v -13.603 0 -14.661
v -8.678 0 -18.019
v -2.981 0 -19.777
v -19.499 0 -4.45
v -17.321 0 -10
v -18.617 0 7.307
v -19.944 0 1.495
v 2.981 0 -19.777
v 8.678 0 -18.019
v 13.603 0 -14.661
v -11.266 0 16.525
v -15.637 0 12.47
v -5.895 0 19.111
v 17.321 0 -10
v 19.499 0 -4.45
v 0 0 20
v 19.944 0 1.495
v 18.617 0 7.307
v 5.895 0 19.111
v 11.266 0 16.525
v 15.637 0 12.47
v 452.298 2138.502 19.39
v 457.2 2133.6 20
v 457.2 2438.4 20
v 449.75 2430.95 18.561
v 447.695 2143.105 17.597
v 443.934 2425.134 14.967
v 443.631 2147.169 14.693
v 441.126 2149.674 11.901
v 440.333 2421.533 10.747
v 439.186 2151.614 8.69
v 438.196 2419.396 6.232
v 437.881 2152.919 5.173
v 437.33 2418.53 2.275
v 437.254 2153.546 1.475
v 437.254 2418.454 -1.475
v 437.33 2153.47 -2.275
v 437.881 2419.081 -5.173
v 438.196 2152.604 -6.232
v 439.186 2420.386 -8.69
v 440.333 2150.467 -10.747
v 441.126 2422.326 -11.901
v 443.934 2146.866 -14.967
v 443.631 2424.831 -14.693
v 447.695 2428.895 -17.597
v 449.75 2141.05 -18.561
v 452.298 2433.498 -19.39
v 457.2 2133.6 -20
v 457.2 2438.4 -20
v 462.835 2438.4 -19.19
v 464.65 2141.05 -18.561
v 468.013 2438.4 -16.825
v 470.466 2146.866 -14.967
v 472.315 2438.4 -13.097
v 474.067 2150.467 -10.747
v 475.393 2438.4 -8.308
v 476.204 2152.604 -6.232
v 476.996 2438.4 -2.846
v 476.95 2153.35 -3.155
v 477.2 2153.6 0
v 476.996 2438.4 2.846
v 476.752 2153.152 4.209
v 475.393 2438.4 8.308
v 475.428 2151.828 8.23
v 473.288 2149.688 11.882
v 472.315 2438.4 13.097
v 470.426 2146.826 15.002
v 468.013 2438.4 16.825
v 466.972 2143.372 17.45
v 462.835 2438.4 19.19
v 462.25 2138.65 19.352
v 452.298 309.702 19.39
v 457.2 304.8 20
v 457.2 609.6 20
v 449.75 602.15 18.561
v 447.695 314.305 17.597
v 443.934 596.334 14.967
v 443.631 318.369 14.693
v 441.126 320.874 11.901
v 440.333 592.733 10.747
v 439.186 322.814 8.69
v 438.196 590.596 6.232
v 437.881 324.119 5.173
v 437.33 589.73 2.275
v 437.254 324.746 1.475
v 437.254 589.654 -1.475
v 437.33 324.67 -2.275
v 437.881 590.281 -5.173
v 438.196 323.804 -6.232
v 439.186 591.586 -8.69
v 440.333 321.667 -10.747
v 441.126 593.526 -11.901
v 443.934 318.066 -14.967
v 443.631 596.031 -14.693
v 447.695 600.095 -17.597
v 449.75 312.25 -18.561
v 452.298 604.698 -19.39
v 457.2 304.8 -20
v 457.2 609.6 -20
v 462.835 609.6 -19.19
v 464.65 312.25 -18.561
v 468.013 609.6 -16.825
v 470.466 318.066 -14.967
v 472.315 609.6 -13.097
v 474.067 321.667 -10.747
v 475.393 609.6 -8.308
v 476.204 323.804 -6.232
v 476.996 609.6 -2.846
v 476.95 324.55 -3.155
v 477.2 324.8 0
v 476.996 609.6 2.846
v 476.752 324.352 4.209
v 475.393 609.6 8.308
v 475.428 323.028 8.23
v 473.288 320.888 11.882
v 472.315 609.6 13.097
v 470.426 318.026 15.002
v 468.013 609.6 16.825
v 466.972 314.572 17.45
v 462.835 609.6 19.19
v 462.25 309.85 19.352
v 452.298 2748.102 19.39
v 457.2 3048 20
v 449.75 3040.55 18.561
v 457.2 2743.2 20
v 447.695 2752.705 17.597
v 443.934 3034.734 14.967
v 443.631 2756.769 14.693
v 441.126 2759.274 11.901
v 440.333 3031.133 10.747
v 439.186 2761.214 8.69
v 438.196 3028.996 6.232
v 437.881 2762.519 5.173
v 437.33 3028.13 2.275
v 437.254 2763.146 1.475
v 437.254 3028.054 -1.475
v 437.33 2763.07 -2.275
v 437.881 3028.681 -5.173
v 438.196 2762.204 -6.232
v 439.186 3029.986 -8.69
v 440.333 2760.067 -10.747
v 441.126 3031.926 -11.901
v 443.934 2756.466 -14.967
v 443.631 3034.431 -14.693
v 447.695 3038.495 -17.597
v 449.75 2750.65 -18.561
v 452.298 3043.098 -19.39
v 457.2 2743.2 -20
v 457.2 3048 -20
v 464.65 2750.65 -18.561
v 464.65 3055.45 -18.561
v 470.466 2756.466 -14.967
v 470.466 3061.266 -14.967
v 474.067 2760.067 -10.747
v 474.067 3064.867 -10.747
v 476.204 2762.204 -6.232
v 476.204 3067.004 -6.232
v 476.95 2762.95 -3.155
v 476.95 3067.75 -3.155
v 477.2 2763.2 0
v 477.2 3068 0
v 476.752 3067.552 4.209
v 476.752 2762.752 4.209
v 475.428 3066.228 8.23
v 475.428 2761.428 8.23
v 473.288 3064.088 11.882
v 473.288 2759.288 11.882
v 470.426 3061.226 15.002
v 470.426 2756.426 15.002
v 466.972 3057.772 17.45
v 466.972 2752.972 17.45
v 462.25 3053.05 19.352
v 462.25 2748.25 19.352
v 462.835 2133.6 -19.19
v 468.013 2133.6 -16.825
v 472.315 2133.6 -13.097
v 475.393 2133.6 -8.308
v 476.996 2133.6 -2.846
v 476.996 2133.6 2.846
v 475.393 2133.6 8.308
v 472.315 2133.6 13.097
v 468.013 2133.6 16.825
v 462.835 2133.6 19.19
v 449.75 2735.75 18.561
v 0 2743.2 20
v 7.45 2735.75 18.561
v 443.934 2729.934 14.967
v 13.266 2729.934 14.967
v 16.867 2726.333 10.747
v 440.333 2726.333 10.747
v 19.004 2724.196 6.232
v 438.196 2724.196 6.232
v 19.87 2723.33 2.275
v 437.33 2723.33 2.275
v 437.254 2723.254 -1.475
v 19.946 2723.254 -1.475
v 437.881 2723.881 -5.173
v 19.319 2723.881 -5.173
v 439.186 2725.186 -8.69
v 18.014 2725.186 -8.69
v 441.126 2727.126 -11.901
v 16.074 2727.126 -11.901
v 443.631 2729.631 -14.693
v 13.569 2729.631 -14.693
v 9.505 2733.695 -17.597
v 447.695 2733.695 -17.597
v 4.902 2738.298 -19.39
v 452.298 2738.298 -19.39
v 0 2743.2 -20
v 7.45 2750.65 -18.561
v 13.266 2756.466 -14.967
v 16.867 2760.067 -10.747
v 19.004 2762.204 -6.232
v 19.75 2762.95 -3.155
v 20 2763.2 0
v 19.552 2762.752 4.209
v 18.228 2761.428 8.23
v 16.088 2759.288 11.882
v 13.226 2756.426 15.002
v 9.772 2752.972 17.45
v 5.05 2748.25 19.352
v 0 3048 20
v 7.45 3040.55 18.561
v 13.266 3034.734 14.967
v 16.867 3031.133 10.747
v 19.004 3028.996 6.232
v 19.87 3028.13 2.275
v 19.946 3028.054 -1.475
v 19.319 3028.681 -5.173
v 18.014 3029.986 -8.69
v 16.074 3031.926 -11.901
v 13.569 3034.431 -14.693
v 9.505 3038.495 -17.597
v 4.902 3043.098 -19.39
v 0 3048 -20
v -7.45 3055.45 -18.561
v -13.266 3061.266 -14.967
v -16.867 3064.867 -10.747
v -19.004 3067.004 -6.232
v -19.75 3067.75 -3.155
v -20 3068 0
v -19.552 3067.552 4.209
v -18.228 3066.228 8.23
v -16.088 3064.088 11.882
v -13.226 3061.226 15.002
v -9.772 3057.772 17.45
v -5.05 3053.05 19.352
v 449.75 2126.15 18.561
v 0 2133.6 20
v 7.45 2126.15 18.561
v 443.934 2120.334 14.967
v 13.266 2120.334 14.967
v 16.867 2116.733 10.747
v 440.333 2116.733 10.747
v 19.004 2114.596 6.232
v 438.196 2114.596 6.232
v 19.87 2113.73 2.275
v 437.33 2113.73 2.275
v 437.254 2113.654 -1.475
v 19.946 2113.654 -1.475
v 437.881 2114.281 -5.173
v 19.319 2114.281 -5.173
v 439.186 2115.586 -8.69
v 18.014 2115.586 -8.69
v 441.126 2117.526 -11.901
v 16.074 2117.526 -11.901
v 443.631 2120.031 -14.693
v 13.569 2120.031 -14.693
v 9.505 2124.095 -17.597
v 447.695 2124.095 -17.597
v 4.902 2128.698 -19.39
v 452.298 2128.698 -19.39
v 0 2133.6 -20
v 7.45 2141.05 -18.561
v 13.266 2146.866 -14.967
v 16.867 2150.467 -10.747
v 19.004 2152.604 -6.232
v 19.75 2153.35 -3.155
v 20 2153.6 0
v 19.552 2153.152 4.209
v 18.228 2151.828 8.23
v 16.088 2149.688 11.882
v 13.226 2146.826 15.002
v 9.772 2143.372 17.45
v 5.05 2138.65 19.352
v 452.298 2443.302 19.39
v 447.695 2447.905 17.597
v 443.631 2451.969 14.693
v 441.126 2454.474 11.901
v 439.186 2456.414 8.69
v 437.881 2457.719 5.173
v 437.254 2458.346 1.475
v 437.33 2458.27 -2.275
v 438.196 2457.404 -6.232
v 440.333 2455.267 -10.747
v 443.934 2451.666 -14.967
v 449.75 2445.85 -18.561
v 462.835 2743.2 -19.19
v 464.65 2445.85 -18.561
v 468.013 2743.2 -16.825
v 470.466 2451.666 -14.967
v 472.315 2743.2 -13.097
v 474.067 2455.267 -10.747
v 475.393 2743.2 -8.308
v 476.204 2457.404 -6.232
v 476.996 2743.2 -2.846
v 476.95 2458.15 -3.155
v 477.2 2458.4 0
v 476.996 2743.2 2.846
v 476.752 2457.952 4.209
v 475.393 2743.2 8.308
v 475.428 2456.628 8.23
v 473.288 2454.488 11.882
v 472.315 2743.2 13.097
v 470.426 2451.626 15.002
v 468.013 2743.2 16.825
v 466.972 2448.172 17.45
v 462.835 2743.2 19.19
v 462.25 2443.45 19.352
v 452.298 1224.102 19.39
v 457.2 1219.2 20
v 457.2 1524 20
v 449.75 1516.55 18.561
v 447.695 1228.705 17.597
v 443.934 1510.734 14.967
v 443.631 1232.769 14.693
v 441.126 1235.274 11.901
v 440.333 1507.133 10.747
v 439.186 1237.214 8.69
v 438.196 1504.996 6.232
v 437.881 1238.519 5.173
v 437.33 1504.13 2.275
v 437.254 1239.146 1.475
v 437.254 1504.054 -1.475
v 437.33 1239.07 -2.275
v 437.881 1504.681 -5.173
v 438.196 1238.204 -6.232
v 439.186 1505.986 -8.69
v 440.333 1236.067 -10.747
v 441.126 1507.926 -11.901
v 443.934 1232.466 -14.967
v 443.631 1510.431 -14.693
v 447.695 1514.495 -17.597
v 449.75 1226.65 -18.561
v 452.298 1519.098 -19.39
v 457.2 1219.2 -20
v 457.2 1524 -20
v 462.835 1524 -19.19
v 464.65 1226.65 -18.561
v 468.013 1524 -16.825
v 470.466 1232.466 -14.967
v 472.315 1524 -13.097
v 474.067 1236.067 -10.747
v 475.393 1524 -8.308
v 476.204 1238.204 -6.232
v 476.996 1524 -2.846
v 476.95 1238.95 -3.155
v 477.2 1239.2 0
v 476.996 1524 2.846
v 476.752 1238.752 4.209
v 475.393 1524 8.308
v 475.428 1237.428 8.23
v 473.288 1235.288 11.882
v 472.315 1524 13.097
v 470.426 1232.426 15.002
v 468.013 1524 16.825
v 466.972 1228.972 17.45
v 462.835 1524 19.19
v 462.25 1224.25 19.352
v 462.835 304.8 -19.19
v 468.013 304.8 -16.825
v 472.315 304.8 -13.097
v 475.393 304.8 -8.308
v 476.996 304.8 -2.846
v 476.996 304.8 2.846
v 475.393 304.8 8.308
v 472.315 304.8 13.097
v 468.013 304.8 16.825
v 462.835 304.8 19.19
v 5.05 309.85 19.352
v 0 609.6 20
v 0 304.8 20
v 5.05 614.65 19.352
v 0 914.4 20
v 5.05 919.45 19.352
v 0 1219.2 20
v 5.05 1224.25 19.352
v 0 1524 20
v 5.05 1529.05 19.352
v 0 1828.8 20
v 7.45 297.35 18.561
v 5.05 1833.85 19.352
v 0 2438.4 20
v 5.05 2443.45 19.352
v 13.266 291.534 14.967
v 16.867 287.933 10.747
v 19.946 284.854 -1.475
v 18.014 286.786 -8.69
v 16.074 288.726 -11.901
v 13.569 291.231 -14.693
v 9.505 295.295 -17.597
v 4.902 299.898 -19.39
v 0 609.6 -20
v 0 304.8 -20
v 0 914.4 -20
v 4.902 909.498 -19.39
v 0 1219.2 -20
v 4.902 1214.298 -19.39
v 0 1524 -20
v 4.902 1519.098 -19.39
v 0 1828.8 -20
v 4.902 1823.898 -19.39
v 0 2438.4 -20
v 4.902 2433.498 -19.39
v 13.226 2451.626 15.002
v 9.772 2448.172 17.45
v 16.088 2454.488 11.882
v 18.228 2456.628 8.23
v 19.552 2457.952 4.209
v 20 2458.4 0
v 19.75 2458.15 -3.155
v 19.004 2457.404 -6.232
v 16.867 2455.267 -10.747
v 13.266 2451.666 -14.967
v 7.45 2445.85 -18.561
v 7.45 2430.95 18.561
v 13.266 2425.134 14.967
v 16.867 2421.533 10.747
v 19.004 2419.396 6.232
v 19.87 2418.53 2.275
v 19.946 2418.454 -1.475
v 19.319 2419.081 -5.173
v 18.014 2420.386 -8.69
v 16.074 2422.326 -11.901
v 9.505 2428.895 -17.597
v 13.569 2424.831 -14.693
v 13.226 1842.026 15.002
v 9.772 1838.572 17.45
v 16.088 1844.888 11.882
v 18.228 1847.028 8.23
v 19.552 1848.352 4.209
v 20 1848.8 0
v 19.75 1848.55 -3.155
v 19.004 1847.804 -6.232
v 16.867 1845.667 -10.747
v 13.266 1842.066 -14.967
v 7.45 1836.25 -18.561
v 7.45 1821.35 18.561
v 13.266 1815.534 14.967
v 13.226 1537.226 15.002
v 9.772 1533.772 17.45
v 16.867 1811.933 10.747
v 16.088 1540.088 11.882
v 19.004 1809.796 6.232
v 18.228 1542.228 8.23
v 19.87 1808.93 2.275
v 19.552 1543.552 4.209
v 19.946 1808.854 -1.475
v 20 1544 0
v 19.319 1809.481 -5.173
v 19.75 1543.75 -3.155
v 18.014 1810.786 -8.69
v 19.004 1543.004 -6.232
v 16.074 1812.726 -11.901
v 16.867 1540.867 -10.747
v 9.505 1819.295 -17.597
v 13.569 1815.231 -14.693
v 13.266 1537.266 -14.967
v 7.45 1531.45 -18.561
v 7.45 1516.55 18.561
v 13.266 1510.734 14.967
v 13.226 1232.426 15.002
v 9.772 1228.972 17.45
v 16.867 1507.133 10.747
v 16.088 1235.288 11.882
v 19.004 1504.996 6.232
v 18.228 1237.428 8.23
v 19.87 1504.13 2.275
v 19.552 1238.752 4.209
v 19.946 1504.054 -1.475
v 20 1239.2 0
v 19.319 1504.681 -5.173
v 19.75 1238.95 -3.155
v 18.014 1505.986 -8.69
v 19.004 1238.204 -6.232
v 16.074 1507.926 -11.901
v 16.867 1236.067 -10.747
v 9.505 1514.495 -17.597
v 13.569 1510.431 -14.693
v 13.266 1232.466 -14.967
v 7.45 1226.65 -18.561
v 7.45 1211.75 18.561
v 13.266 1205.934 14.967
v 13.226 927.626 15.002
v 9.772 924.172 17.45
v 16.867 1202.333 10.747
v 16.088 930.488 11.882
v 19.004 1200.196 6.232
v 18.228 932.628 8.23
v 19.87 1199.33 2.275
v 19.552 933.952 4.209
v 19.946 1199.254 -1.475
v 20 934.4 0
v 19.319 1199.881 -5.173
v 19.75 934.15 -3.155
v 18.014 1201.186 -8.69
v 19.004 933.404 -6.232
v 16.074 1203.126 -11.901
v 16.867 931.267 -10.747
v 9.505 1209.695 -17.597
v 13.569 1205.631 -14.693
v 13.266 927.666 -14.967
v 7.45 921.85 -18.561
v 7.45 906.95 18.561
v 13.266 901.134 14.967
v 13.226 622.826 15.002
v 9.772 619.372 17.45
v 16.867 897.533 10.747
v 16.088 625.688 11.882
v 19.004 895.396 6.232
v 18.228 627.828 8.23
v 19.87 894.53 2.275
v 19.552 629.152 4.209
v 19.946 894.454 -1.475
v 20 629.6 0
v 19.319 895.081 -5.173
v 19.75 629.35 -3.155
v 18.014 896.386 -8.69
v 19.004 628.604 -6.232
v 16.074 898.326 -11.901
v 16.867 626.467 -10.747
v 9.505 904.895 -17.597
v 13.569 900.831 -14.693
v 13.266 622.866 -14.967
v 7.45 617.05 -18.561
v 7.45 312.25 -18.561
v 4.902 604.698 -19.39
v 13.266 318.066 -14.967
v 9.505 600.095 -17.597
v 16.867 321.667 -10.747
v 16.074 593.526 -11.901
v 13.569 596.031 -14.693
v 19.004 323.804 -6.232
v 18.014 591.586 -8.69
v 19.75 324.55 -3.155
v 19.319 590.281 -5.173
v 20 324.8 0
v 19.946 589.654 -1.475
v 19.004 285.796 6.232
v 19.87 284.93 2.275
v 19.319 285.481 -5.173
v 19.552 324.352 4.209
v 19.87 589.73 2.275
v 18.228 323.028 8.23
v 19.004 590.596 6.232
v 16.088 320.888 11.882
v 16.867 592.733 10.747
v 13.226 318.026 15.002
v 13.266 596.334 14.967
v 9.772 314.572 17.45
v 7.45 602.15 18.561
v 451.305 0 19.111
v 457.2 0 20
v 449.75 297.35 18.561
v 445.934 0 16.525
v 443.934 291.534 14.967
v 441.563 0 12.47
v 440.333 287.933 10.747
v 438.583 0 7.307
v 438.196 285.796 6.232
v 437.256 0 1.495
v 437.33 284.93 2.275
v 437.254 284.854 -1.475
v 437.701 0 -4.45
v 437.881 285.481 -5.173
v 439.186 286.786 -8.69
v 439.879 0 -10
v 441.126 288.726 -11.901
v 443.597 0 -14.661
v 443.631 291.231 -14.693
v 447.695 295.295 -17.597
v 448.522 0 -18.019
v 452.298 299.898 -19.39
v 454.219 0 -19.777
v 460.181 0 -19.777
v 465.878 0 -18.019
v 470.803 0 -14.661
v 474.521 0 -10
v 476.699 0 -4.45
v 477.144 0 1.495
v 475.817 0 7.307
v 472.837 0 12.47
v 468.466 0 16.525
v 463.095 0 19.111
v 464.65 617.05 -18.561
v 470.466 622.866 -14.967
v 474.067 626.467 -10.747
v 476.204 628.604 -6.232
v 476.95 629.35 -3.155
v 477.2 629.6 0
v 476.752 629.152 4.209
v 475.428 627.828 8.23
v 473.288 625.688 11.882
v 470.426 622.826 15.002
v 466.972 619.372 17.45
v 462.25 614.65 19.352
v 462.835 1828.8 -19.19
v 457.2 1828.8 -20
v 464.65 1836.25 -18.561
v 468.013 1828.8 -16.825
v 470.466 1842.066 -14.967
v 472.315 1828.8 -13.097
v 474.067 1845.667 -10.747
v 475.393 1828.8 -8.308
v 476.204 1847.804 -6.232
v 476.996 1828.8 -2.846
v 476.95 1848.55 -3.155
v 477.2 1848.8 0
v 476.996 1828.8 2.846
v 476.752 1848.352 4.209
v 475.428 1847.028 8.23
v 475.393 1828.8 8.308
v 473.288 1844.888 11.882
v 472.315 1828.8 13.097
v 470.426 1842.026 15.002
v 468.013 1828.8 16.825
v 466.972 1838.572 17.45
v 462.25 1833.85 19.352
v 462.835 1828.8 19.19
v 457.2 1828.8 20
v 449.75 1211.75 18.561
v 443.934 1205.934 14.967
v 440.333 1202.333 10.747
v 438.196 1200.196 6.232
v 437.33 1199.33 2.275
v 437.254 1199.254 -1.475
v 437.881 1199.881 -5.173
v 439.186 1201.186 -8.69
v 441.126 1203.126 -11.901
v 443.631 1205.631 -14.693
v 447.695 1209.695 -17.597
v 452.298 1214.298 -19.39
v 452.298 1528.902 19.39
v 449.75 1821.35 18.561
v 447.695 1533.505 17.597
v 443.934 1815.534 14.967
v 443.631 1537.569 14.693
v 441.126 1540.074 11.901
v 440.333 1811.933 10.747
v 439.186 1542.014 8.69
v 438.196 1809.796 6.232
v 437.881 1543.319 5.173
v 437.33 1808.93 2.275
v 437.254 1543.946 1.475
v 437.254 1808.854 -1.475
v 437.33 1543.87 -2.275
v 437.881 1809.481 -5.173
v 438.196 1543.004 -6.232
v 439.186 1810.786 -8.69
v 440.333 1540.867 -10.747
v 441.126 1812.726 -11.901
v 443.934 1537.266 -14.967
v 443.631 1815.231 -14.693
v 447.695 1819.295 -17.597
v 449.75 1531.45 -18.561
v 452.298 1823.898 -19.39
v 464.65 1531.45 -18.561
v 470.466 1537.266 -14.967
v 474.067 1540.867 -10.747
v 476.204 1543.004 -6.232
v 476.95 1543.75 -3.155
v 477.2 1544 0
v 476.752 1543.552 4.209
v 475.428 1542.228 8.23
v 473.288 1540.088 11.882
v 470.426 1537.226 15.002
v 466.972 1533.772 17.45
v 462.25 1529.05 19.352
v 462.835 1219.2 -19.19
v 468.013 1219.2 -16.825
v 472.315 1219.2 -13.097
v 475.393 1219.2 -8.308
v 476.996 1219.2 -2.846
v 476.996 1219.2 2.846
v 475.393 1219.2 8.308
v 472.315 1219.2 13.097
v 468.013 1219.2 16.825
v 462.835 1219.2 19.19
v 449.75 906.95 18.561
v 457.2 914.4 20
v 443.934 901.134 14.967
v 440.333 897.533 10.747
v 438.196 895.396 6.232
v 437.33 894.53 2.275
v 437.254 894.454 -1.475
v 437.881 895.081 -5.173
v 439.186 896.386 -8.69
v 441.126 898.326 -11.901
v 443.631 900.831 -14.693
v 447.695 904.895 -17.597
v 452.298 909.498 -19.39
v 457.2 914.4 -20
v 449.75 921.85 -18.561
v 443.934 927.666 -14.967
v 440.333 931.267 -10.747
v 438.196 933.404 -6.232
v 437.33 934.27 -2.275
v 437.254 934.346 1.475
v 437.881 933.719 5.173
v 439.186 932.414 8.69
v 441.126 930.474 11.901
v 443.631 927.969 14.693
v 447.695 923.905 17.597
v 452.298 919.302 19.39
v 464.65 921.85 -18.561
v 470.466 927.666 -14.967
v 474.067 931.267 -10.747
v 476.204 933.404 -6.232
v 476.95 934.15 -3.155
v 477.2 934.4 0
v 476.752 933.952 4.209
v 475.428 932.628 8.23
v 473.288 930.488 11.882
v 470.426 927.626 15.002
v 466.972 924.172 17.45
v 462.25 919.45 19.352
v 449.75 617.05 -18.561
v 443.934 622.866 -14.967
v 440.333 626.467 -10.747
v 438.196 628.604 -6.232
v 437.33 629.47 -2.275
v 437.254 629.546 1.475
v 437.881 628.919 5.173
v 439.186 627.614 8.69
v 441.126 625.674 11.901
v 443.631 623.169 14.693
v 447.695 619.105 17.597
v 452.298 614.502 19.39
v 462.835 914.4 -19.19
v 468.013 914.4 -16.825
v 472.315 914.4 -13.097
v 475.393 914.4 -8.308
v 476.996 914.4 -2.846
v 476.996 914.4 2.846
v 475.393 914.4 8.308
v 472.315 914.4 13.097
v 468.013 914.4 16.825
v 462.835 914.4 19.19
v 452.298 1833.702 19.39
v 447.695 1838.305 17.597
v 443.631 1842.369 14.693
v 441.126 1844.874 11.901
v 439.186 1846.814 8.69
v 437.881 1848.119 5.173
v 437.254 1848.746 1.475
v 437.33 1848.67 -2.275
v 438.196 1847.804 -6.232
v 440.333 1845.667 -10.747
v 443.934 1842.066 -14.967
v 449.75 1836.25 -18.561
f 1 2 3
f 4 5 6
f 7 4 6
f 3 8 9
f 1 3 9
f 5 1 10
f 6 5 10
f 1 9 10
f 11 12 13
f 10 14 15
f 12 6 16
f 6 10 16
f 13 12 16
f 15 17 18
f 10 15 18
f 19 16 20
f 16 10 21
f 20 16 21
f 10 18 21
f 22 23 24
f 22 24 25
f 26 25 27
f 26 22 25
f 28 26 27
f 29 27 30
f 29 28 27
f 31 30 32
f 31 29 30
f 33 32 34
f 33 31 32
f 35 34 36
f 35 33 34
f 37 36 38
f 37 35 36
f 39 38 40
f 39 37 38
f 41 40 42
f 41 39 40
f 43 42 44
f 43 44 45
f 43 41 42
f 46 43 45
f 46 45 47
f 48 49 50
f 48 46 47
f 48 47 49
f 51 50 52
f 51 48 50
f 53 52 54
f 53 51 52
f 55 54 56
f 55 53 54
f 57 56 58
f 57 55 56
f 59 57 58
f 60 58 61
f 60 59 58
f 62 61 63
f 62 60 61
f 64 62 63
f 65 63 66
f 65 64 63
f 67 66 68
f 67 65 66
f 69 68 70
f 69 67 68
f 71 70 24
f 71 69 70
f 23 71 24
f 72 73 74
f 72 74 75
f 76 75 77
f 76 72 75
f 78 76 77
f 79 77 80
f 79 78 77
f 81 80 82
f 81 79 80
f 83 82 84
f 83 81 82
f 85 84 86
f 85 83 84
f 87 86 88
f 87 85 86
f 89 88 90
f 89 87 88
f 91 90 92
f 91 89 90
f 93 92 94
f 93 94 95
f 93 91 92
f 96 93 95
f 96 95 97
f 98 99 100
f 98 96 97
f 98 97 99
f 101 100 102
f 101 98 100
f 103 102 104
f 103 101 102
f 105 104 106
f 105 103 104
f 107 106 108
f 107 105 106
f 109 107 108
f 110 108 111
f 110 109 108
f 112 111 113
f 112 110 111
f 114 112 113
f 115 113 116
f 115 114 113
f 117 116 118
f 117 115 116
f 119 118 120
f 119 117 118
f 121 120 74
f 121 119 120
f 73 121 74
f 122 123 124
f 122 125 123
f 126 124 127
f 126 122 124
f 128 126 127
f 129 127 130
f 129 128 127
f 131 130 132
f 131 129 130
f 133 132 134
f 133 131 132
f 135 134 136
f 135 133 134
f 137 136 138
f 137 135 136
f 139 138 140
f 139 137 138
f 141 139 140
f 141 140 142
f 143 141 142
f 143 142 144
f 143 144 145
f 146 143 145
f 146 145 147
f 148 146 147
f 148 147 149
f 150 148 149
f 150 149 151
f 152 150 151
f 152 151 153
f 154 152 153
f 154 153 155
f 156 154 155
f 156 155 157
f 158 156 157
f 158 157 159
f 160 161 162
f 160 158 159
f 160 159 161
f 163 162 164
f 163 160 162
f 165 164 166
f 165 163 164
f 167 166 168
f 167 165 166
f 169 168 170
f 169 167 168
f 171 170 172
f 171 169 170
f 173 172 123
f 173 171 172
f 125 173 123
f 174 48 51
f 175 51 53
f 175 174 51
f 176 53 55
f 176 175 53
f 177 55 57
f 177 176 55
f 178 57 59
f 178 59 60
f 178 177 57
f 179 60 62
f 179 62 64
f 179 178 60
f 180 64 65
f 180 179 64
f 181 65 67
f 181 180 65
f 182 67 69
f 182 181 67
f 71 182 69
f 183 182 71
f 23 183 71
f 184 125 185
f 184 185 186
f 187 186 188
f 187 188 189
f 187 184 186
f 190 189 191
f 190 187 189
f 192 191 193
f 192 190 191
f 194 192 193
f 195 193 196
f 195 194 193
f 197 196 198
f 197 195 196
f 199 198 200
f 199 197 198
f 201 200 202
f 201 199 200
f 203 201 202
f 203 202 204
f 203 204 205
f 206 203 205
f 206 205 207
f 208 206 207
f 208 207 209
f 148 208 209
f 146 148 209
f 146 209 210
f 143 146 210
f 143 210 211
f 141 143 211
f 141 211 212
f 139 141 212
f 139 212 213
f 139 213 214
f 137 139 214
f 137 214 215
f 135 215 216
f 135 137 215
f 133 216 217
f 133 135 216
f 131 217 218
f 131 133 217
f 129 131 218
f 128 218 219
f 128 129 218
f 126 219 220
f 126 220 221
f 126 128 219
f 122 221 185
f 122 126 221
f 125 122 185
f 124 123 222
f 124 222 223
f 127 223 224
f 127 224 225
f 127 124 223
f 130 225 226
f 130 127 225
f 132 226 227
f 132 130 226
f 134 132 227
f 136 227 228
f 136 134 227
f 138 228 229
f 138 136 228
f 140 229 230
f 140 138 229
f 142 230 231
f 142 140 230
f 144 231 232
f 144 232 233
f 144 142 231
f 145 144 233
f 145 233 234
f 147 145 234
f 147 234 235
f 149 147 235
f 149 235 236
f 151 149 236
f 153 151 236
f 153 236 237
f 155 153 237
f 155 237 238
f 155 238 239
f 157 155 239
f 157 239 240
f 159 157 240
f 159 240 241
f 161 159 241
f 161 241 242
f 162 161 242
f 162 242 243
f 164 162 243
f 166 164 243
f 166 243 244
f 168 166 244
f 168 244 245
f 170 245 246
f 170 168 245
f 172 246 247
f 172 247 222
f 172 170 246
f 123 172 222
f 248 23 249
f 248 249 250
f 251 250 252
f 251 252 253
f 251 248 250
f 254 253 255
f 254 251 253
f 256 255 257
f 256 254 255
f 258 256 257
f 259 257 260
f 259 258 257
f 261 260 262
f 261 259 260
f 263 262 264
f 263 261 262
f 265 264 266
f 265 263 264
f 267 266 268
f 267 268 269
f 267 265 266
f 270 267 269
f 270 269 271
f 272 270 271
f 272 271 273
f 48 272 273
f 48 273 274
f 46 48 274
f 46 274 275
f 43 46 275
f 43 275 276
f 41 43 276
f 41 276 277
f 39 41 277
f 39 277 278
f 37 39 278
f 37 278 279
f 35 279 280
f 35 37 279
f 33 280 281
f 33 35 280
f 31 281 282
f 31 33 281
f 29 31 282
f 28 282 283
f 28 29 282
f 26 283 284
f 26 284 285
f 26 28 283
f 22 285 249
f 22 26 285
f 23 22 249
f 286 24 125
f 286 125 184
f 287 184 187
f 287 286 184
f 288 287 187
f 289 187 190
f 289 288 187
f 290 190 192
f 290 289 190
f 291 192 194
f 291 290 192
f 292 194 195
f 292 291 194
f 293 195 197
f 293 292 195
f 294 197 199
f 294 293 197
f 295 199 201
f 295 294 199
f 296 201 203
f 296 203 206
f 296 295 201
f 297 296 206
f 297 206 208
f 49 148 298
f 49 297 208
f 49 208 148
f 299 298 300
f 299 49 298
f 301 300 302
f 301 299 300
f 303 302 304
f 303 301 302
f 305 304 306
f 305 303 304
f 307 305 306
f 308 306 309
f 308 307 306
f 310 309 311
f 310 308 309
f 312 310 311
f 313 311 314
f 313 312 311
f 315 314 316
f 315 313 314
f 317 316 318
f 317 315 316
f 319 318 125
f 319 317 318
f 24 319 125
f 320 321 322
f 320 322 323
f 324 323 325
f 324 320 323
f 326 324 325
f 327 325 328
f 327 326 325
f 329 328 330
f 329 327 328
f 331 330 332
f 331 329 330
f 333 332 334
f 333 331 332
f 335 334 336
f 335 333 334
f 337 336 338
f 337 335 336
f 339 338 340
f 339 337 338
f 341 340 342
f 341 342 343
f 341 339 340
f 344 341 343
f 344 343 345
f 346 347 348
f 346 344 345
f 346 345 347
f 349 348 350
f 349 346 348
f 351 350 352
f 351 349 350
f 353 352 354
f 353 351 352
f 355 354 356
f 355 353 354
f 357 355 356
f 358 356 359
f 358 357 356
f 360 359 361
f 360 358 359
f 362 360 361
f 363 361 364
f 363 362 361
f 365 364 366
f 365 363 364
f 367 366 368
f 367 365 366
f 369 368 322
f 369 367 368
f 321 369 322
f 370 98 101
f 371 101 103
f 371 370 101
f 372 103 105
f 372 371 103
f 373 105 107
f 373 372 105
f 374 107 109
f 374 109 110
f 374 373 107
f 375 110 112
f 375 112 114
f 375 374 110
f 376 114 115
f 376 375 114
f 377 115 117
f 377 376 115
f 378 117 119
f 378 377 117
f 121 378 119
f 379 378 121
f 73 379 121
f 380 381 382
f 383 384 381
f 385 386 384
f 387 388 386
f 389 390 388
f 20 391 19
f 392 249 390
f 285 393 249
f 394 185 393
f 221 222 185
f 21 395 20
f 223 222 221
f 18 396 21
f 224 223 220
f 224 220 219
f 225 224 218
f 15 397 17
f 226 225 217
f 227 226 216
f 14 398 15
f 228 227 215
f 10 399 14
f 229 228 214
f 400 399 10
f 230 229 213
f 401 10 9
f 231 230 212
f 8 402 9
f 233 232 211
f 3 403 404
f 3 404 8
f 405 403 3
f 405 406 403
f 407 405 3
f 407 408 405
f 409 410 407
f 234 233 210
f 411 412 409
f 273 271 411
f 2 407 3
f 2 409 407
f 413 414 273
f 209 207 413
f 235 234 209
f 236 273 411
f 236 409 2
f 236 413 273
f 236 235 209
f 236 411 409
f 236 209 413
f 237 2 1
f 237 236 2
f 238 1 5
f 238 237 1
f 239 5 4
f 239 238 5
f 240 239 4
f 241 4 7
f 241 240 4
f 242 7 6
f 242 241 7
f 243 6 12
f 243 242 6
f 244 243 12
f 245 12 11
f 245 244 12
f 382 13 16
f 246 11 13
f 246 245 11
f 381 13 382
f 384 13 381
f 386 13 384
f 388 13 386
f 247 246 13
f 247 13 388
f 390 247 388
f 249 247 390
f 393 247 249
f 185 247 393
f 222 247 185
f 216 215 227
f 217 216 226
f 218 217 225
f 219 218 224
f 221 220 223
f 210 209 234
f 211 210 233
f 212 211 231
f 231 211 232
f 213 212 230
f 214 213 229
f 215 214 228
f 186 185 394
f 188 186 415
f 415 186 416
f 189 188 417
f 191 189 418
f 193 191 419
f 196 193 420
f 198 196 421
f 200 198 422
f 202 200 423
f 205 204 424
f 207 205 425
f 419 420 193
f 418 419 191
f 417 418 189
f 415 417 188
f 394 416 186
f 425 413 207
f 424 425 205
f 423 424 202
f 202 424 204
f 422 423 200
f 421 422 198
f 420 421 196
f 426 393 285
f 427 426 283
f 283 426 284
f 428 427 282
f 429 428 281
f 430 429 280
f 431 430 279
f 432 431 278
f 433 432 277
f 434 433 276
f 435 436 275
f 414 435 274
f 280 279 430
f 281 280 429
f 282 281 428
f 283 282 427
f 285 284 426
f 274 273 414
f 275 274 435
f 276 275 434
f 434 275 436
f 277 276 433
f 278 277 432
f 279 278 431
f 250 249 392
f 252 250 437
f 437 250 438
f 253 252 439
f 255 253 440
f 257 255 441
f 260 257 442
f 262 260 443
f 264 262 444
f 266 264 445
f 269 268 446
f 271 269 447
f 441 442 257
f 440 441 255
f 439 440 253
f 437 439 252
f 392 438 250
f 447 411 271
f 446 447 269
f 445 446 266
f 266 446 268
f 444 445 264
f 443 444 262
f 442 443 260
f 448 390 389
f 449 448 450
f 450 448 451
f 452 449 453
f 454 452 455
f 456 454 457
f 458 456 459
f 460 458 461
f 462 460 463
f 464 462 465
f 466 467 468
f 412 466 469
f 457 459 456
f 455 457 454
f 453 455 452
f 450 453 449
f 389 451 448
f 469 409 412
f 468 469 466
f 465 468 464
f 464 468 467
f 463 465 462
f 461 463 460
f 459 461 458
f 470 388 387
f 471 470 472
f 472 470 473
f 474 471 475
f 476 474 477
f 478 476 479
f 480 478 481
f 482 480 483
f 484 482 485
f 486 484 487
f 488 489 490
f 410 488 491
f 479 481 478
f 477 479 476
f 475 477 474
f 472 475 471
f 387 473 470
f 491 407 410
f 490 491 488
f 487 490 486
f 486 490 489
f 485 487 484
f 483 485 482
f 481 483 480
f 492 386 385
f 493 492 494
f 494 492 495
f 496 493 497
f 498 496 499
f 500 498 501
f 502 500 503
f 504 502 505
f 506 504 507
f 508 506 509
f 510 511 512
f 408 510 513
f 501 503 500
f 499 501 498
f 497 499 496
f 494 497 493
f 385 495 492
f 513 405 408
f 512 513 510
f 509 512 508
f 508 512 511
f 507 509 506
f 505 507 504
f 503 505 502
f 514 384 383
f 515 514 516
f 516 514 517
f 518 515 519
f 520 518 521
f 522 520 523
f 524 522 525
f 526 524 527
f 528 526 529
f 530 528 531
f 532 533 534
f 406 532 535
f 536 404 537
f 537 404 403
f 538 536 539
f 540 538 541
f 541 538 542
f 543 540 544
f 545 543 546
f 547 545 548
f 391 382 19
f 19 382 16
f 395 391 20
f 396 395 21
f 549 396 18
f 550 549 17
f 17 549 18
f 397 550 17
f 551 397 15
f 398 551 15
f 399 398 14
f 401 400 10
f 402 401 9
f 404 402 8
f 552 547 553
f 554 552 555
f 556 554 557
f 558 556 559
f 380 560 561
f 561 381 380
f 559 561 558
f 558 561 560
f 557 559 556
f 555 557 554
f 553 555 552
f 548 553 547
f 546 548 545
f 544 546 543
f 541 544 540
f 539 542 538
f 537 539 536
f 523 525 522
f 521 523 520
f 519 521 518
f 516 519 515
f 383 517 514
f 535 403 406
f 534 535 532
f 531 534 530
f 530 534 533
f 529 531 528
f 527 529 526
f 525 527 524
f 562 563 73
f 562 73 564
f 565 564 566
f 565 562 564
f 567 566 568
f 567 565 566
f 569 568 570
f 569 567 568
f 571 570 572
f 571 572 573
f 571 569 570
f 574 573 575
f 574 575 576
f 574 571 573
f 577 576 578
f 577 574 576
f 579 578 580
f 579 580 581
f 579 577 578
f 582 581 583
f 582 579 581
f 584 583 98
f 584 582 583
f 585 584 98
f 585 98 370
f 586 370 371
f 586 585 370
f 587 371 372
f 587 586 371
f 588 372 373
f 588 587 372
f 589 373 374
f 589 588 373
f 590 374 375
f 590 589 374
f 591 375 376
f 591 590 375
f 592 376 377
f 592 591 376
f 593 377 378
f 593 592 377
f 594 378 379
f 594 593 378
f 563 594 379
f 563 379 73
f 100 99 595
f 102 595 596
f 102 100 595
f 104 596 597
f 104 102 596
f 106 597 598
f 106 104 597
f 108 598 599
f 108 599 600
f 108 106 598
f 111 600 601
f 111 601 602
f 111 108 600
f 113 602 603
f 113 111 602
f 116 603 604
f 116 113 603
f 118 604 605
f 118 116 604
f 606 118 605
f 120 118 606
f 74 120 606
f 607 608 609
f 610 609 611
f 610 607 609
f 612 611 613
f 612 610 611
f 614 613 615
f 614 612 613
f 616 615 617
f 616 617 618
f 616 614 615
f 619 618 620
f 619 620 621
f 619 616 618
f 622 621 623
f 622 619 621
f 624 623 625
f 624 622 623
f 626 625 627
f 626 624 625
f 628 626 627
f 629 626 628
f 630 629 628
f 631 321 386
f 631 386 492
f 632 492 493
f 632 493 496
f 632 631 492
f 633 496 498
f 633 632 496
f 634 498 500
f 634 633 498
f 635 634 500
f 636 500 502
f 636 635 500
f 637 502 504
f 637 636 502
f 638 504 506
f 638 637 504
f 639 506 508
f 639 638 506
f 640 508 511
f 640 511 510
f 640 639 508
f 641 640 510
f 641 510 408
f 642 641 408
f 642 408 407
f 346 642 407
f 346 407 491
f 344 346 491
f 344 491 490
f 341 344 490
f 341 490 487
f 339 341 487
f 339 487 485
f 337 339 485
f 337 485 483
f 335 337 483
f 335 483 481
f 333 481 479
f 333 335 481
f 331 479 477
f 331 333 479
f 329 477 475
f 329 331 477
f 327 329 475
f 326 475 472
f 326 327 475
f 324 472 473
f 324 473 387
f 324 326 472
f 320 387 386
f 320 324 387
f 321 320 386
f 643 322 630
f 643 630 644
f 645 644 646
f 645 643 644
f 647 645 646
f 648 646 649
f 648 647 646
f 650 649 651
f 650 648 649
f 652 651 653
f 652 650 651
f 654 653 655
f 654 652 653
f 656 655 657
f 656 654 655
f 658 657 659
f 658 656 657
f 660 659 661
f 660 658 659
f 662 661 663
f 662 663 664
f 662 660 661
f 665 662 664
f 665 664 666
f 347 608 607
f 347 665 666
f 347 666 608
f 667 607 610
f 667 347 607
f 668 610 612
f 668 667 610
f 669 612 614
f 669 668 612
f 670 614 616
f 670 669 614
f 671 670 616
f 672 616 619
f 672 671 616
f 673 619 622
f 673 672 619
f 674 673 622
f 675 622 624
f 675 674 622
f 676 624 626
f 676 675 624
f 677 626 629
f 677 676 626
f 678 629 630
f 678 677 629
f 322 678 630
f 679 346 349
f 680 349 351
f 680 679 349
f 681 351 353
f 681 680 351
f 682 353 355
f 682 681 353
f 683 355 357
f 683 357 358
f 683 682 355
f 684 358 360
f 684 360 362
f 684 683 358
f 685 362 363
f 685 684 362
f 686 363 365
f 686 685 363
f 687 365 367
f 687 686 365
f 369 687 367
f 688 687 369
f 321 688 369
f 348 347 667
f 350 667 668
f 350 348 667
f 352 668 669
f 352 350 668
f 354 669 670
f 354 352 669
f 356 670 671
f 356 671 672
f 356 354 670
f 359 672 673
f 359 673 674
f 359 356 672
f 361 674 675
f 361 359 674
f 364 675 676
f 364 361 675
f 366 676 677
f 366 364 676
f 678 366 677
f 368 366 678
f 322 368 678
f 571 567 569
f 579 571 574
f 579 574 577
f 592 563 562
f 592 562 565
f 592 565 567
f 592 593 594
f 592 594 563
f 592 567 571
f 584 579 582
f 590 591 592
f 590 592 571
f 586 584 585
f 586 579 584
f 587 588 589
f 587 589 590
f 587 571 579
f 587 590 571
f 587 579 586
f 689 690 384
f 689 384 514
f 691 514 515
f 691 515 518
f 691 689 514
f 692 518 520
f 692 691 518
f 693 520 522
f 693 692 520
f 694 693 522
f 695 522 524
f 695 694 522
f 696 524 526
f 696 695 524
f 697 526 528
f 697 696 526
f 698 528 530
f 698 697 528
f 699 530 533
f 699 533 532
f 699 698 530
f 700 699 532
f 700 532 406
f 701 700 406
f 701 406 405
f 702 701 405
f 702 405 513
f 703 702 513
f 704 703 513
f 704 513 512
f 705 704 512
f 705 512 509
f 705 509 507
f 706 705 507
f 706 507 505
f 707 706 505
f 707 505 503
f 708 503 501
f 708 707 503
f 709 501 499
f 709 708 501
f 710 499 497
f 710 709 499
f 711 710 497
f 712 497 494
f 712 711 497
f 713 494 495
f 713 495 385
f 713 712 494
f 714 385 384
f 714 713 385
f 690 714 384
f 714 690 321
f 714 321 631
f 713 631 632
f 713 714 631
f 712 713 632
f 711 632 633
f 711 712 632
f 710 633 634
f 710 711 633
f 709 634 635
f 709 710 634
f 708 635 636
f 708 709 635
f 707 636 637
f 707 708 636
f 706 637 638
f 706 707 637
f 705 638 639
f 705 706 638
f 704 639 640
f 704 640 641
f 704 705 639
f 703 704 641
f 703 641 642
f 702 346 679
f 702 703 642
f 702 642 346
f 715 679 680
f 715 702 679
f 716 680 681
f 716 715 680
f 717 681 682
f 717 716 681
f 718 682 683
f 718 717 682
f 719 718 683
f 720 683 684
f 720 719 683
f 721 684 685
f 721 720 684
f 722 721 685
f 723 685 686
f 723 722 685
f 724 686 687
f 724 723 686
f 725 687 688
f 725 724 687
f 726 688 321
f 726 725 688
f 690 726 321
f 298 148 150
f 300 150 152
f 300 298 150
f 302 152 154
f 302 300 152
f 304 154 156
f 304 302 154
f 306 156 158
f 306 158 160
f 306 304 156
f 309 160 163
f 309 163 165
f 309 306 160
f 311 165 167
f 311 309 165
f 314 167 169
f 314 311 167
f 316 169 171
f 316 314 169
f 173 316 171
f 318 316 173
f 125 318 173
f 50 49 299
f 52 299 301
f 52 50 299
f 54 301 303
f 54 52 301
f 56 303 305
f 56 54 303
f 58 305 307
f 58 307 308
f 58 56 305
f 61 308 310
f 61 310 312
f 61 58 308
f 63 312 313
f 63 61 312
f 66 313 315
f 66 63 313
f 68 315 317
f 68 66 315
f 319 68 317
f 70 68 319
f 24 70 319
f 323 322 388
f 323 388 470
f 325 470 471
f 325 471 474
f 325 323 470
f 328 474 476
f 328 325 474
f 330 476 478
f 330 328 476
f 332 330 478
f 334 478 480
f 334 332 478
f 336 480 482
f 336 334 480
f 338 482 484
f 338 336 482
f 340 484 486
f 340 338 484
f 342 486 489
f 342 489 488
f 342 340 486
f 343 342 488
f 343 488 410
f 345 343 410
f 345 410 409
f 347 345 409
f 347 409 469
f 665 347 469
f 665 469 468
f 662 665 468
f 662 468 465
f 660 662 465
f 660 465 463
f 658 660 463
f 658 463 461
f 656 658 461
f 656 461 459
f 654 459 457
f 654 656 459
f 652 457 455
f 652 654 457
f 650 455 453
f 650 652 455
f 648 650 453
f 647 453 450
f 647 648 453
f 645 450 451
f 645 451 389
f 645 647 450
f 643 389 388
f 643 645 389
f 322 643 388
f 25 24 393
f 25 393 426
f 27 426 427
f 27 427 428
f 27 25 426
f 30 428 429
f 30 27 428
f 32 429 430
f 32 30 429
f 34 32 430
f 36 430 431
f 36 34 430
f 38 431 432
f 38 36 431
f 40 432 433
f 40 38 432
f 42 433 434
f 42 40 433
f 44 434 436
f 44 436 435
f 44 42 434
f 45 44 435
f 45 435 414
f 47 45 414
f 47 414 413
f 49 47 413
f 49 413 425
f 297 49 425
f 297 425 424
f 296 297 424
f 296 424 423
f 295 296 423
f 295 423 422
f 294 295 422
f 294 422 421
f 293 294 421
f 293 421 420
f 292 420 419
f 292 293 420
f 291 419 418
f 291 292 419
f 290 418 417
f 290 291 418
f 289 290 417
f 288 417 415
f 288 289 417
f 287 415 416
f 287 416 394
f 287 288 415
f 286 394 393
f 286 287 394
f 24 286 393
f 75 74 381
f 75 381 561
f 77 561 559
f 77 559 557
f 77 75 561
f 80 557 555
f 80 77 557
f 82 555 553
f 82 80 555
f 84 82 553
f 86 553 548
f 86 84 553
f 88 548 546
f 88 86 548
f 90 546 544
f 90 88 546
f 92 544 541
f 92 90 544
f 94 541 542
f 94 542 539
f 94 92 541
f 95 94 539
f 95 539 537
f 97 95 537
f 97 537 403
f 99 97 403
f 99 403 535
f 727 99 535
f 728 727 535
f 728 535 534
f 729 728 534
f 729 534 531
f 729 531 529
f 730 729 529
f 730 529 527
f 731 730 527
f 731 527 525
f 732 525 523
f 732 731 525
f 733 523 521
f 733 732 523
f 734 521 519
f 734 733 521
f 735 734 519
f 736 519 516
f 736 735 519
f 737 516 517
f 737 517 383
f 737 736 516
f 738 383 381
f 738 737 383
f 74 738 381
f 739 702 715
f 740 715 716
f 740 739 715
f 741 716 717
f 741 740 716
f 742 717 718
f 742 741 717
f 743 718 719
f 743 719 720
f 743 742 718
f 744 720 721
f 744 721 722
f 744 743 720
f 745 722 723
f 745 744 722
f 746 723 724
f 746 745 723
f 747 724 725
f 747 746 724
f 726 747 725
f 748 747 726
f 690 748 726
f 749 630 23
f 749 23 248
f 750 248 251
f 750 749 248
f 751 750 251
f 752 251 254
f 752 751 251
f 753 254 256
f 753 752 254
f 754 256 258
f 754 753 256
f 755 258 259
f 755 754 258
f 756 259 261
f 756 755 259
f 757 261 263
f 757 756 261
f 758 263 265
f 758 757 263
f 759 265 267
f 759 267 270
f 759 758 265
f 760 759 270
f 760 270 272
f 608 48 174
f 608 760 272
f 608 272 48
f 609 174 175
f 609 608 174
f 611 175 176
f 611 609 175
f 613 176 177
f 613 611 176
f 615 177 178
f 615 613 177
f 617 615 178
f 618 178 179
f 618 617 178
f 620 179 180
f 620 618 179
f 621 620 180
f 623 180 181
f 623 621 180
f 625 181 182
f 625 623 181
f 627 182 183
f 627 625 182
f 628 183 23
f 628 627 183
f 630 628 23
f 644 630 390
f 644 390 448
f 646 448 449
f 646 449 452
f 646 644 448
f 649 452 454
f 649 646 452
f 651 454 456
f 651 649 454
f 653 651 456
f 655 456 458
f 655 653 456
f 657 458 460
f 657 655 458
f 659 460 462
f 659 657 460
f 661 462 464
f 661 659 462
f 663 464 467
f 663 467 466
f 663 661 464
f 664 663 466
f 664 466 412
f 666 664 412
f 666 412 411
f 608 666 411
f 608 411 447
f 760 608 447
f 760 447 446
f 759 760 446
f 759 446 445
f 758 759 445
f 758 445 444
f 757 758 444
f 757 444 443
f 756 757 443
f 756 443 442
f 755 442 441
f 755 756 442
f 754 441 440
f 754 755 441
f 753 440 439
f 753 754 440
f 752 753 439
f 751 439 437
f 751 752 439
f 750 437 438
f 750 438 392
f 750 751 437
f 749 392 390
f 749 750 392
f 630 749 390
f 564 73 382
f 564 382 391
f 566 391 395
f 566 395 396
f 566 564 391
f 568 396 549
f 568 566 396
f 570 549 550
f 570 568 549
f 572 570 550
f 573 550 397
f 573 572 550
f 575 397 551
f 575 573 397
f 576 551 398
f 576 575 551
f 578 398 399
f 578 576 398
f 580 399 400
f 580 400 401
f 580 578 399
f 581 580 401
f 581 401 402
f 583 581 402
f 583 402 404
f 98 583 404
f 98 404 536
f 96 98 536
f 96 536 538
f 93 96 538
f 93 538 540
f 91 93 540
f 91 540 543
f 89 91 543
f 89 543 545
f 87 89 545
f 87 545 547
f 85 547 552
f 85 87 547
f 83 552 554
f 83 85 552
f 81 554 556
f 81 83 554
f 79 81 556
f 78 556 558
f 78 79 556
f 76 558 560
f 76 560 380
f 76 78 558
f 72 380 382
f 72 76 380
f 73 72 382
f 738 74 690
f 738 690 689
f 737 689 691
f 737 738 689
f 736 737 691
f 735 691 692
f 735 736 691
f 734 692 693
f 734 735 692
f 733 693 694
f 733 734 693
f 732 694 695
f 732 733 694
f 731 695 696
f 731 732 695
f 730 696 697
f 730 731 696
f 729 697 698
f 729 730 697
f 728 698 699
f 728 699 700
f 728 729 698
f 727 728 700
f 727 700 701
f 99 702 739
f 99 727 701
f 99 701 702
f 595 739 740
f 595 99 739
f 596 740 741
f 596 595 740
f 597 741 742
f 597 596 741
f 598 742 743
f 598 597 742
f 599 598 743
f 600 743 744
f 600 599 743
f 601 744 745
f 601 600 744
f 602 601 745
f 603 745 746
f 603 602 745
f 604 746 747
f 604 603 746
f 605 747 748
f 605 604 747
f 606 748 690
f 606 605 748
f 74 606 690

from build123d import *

# Parameters (mm, degrees)
SWEEP1_PROFILE_R = 20
LPATTERN1_COUNT  = 10
LPATTERN1_PITCH  = 304.8


with BuildPart() as part:
    # Sweep1: sweep along a path in Sketch3
    with BuildLine(Plane.XY) as sweep1_path:
        Line((0, 0), (0, 304.8))
        Line((0, 304.8), (457.2, 304.8))
        Line((457.2, 304.8), (457.2, 0))
    # Sweep1 profile (on start of the path) → Sweep1 (sweep)
    with BuildSketch(Plane.ZX):
        Circle(SWEEP1_PROFILE_R)
    sweep1 = sweep(path=sweep1_path.line, transition=Transition.RIGHT)

    # LPattern1: Sweep1 ×10
    with Locations(*[(0, i * LPATTERN1_PITCH, 0) for i in range(1, LPATTERN1_COUNT)]):
        add(sweep1)


solid = part.part
